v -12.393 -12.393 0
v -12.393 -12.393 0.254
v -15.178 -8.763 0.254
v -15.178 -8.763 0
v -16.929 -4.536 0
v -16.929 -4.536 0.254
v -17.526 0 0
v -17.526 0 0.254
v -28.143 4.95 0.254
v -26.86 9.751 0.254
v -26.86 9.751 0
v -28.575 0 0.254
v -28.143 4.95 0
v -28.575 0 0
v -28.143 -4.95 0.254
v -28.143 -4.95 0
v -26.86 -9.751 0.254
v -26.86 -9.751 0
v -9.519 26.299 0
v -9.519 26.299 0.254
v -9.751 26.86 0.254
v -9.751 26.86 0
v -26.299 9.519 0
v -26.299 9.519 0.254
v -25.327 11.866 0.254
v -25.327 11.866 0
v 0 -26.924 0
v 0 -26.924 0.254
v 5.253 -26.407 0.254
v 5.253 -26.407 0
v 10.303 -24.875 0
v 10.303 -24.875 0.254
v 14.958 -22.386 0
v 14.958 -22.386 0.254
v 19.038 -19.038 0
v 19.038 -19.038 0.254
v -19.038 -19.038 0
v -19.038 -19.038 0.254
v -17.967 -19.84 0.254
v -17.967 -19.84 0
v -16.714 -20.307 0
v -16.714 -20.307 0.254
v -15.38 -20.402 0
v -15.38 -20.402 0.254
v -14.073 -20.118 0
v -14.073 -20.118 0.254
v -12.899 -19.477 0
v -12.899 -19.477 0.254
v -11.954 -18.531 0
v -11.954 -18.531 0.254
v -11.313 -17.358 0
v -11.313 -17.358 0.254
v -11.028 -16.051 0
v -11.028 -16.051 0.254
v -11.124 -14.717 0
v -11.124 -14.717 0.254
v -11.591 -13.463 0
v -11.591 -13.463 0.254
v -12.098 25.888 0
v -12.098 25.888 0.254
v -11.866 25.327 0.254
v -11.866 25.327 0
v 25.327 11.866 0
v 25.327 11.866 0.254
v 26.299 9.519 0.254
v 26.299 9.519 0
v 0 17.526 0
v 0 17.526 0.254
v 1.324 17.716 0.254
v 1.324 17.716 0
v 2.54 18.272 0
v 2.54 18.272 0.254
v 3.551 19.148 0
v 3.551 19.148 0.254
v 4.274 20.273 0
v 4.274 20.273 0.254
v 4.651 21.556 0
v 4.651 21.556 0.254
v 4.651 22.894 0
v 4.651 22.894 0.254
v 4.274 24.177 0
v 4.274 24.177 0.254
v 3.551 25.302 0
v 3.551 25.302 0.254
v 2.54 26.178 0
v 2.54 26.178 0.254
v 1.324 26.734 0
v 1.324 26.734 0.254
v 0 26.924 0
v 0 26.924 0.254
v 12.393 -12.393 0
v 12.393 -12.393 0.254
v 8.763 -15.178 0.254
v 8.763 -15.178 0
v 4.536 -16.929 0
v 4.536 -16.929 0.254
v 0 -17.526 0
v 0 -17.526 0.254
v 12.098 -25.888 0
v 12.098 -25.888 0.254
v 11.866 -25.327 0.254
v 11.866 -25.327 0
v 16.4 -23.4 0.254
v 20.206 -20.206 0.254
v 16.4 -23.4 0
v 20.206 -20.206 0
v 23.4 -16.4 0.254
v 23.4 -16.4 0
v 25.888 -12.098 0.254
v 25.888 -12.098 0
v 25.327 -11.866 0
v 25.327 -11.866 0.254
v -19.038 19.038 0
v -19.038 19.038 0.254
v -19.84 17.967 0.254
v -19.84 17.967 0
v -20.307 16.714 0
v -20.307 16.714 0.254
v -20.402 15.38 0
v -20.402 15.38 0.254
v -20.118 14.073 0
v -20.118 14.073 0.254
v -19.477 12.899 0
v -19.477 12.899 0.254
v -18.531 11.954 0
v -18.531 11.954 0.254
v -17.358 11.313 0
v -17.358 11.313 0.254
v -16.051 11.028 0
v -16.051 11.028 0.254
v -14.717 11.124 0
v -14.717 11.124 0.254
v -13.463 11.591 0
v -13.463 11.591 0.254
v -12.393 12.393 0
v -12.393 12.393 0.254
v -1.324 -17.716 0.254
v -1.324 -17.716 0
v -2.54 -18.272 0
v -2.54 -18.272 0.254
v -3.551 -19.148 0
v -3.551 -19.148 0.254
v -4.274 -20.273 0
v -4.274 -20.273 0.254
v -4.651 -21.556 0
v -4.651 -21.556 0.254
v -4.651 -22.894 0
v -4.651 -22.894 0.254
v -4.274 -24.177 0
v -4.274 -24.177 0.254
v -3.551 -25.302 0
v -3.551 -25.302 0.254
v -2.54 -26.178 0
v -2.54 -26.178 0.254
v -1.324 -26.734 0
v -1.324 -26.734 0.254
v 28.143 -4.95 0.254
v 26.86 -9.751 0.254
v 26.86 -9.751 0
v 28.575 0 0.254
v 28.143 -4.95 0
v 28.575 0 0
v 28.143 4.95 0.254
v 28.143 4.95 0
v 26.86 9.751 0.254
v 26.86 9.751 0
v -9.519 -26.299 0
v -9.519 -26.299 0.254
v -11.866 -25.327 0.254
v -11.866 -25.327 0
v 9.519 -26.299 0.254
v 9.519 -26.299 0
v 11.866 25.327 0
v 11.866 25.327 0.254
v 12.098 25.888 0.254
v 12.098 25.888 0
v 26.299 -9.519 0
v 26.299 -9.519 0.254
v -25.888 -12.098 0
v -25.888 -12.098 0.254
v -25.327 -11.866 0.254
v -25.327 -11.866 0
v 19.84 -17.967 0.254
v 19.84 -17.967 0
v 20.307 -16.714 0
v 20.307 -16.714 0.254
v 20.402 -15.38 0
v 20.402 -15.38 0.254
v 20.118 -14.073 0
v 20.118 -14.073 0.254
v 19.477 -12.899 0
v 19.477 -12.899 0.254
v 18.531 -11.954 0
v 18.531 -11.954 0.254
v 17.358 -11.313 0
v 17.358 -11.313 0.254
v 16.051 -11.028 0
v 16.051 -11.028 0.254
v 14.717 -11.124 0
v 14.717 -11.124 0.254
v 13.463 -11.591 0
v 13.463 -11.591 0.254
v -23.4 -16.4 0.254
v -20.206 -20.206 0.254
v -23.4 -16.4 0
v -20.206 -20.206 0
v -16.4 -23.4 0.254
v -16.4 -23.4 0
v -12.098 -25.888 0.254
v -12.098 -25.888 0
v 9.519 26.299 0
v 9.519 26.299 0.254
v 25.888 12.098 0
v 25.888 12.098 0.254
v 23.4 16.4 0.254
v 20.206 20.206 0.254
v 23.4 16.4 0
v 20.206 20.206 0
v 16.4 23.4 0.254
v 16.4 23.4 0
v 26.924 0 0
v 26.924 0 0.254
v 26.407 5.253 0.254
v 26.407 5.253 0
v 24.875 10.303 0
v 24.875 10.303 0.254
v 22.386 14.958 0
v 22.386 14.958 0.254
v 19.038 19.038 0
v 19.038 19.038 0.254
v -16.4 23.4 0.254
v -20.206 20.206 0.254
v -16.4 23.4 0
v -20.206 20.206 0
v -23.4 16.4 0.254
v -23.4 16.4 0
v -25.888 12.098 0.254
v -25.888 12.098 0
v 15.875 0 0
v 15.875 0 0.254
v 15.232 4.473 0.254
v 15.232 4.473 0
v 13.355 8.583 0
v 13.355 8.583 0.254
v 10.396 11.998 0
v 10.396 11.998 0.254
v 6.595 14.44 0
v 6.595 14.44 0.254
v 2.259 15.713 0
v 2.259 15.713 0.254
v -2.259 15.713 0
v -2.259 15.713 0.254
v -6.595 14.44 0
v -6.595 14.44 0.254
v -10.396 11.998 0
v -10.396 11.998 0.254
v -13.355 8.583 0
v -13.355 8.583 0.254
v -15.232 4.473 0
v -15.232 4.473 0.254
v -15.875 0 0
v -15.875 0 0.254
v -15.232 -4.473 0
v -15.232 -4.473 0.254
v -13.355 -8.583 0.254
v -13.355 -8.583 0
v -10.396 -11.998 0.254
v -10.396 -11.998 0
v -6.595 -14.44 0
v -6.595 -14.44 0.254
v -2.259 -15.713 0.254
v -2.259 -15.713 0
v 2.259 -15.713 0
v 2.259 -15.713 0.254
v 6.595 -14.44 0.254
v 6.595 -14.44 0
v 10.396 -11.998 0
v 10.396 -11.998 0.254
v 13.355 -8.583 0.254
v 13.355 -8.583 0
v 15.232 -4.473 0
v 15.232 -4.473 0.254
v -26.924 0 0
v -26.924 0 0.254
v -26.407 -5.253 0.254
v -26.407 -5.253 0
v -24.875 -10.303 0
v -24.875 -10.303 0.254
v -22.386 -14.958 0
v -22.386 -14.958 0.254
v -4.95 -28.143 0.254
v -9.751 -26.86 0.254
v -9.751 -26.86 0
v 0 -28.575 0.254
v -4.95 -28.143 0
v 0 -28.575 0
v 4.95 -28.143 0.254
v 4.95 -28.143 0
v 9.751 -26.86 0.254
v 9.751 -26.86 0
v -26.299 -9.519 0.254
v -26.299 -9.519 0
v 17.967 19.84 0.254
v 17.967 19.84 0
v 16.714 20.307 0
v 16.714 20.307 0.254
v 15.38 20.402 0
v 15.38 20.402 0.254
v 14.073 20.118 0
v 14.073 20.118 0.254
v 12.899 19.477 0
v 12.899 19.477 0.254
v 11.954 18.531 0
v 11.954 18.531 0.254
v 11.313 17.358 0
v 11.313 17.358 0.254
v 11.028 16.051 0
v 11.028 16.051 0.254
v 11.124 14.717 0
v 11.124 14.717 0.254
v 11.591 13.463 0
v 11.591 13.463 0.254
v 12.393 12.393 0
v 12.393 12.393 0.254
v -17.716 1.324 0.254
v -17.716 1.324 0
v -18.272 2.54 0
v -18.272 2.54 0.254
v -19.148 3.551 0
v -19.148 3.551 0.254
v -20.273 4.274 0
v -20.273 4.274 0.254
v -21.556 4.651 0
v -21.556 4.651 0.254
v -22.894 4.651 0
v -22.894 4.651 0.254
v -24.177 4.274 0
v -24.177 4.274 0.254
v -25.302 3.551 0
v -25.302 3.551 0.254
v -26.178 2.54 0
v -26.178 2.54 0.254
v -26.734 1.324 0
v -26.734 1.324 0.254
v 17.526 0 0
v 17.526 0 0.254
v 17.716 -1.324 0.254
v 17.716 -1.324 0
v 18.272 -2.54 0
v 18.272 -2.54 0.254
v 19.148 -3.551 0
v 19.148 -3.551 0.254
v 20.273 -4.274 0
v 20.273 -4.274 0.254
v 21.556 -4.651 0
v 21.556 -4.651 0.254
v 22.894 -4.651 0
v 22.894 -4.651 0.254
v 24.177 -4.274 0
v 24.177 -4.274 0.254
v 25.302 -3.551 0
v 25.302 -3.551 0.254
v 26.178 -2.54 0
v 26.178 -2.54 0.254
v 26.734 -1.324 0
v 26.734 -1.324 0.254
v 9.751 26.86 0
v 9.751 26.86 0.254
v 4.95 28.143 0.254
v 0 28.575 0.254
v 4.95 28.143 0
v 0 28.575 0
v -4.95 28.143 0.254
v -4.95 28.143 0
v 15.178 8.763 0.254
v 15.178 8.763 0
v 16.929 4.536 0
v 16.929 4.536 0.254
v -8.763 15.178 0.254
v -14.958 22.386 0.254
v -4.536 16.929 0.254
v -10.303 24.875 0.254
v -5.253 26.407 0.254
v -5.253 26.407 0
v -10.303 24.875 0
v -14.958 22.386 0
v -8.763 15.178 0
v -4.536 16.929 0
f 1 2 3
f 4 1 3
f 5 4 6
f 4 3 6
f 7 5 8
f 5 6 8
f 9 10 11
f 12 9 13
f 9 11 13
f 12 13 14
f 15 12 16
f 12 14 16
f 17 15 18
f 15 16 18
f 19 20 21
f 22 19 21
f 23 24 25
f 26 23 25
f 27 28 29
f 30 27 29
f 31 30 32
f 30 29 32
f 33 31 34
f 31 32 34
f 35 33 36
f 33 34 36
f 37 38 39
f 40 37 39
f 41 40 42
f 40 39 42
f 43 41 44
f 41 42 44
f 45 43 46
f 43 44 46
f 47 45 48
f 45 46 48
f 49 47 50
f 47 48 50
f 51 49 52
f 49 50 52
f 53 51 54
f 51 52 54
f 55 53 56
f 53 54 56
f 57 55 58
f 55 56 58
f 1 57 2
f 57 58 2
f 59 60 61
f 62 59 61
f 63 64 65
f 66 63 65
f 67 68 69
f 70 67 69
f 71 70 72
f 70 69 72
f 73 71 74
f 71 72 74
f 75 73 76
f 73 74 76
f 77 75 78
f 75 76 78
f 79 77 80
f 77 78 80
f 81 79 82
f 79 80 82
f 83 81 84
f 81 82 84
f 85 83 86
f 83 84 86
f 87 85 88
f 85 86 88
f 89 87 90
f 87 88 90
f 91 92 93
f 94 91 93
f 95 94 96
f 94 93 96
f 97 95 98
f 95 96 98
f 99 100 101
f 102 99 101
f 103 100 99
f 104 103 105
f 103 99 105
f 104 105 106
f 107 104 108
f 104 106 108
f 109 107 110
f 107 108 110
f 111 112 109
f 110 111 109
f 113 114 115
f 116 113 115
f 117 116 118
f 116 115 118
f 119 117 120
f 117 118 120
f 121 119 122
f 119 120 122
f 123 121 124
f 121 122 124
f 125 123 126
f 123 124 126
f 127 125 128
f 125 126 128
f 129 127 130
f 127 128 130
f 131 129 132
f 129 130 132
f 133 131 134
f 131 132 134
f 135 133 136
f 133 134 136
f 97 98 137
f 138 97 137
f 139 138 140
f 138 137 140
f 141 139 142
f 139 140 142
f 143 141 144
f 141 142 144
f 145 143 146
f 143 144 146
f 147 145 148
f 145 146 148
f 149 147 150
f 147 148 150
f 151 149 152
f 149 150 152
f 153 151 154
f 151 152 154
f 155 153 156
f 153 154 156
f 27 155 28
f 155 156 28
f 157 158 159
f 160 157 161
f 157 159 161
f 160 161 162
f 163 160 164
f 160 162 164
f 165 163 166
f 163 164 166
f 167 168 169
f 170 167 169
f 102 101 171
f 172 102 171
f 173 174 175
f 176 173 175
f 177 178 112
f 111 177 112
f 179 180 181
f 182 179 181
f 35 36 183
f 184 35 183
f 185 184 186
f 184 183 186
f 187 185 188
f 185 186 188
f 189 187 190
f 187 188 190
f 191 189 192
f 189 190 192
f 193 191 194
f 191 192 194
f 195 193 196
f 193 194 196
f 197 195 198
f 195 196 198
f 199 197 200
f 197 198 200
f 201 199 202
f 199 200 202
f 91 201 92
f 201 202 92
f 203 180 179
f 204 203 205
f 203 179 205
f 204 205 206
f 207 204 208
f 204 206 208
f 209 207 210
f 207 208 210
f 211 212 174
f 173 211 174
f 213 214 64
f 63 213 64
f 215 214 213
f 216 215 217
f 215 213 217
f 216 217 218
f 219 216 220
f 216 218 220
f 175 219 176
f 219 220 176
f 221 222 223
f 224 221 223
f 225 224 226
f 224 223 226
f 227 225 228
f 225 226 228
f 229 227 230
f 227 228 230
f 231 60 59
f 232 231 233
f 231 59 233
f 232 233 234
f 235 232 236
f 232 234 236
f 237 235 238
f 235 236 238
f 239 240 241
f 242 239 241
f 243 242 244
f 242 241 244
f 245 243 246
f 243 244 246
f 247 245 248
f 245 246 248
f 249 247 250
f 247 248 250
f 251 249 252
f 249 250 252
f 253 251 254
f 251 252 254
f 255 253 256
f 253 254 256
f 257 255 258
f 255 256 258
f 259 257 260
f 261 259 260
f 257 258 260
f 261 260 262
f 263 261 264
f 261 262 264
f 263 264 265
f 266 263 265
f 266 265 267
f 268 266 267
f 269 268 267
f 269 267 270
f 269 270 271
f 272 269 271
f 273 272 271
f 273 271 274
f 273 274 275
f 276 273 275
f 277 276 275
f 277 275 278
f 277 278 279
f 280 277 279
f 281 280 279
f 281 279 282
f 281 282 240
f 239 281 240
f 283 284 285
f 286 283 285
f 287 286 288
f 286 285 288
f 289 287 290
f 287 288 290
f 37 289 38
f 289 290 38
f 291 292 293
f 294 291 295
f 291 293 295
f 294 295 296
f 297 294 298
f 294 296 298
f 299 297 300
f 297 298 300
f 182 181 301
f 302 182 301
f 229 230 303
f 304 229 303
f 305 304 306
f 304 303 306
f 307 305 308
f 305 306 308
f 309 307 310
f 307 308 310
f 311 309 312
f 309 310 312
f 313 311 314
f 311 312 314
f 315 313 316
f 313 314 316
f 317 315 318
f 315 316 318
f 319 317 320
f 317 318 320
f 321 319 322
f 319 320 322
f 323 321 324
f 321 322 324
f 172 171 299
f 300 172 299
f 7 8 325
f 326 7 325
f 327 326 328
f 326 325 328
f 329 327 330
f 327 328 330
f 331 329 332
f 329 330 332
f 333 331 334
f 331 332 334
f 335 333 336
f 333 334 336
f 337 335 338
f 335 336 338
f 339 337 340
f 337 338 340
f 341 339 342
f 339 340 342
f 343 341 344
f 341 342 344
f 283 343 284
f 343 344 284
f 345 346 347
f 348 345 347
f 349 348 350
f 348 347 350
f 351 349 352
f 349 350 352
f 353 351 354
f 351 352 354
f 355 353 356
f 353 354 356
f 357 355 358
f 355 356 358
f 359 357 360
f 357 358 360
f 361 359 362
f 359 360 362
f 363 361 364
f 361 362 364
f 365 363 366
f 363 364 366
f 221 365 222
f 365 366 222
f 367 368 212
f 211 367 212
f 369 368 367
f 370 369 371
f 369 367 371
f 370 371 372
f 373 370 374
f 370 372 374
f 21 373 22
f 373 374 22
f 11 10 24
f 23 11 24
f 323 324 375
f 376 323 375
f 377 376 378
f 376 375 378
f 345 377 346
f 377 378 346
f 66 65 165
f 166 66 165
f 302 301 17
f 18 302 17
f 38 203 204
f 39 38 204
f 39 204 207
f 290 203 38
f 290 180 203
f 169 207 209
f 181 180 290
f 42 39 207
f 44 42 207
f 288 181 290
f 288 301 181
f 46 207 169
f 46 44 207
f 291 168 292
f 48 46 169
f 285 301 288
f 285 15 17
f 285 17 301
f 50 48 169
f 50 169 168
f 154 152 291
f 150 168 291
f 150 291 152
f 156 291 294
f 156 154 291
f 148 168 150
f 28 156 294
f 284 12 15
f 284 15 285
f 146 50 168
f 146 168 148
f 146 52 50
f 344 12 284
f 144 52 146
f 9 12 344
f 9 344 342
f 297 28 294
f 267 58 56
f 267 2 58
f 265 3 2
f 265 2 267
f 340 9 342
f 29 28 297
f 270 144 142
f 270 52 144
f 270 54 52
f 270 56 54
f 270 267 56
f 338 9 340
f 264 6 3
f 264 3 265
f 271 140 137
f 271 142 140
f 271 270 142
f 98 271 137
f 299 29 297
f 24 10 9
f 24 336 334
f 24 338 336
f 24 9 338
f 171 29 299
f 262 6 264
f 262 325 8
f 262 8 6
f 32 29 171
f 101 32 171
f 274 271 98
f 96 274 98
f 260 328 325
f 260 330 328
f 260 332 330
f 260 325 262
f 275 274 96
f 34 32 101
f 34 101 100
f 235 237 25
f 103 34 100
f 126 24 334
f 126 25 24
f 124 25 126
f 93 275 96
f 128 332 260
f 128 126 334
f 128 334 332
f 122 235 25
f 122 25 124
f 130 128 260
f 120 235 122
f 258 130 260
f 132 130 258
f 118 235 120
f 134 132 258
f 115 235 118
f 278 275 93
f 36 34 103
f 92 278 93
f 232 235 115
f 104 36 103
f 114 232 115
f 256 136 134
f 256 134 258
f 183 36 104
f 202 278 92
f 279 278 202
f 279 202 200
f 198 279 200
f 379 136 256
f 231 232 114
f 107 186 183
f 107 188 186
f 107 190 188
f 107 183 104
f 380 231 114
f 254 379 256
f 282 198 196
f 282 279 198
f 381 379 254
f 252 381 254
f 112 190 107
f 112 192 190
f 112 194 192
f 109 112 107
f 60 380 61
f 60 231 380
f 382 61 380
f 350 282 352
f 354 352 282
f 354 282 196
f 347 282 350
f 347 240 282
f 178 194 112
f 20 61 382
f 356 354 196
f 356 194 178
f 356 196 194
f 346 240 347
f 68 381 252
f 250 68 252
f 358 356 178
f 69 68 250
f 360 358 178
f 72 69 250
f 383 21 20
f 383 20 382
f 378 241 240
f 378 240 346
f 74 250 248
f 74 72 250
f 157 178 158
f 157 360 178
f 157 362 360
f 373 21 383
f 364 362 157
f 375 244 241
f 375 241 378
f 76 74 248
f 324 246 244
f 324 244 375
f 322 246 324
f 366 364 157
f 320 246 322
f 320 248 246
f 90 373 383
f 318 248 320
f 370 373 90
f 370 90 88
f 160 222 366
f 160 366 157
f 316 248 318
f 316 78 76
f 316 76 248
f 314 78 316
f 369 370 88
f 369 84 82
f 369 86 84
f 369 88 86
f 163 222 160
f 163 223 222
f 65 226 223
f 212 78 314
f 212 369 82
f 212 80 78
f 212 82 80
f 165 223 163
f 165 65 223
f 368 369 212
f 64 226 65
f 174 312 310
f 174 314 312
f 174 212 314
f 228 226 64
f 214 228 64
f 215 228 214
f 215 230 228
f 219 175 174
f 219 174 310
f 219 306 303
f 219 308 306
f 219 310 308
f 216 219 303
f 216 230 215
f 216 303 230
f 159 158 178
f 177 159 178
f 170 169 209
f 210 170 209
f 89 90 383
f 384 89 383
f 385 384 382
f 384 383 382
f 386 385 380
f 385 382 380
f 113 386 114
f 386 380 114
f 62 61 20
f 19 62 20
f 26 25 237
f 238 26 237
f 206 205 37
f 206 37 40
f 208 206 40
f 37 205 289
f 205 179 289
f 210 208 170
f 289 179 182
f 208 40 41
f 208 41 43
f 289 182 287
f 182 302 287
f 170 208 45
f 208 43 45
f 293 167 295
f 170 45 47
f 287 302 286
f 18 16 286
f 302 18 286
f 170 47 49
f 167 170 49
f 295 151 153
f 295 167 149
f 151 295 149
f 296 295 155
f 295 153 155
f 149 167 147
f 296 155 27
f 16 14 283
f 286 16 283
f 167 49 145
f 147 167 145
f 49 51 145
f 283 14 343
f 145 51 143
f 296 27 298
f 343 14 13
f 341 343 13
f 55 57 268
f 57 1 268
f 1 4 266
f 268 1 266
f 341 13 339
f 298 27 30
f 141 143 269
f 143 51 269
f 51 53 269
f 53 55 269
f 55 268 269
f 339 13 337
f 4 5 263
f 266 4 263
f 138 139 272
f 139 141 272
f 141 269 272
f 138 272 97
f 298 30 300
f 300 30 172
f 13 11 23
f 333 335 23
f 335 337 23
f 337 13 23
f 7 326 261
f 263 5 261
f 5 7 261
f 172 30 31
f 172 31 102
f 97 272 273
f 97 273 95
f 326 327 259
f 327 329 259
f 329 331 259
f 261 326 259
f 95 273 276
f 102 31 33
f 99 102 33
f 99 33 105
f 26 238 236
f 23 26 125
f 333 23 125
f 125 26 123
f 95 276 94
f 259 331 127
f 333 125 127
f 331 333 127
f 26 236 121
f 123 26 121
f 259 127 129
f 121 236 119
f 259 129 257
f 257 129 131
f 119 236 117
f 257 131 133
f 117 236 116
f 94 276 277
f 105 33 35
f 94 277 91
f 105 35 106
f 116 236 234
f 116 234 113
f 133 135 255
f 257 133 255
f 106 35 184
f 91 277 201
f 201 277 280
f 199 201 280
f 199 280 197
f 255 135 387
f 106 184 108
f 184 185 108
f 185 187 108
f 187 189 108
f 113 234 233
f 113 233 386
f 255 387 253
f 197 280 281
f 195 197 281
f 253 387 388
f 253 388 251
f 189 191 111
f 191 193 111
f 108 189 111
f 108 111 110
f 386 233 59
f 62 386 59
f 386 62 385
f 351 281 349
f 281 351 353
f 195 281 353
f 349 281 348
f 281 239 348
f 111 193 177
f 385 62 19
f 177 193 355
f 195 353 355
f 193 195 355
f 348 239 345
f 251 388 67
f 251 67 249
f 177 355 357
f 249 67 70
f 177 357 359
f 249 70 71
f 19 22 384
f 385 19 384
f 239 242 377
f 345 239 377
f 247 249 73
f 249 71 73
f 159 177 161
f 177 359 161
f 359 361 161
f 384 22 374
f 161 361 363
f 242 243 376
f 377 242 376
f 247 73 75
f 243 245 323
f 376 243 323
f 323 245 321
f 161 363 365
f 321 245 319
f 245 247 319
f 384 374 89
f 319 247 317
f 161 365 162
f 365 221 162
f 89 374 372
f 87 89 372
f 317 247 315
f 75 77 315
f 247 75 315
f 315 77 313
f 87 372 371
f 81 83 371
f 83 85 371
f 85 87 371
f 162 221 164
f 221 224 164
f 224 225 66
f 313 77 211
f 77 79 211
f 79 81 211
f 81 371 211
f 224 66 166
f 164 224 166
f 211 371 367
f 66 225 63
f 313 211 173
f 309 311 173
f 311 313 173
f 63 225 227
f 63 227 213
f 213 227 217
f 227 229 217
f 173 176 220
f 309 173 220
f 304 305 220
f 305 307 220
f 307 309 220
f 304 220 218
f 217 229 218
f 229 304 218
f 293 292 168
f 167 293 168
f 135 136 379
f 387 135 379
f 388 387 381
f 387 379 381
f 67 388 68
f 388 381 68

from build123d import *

# Parameters (mm, degrees)
SKETCH4_R           = 28.575
BOSS_EXTRUDE2_DEPTH = 0.254
SKETCH5_R           = 15.875
CUT_EXTRUDE5_DEPTH  = 1.254
CUT_EXTRUDE6_DEPTH  = 1.254
CUT_EXTRUDE11_DEPTH = 1.254


with BuildPart() as part:
    # Sketch4 → Boss-Extrude2 (new body)
    with BuildSketch(Plane.XY):
        Circle(SKETCH4_R)
    extrude(amount=BOSS_EXTRUDE2_DEPTH)

    # Sketch5 → Cut-Extrude5 (cut, through all)
    with BuildSketch(Plane.XY.offset(0.254)):
        Circle(SKETCH5_R)
    extrude(amount=-CUT_EXTRUDE5_DEPTH, mode=Mode.SUBTRACT)

    # Sketch6 → Cut-Extrude6 (cut, through all)
    with BuildSketch(Plane.XY.offset(0.254)):
        with BuildLine():
            ThreePointArc((19.038143, 19.038142953), (12.392753451, 19.038142981), (12.392753462, 12.392753432))
            ThreePointArc((12.392753462, 12.392753432), (16.1919128, 6.706909562), (17.526, -5.71e-07))
            ThreePointArc((17.526, -5.71e-07), (22.224999847, -4.699), (26.924, -8.77e-07))
            ThreePointArc((26.924, -8.77e-07), (24.874532708, 10.303368312), (19.038143, 19.038142953))
        make_face()
        with BuildLine():
            ThreePointArc((19.038142953, -19.038143), (19.038142981, -12.392753451), (12.392753432, -12.392753462))
            ThreePointArc((12.392753432, -12.392753462), (6.706909562, -16.1919128), (-5.71e-07, -17.526))
            ThreePointArc((-5.71e-07, -17.526), (-4.699, -22.224999847), (-8.77e-07, -26.924))
            ThreePointArc((-8.77e-07, -26.924), (10.303368312, -24.874532708), (19.038142953, -19.038143))
        make_face()
        with BuildLine():
            ThreePointArc((-19.038143, -19.038142953), (-12.392753451, -19.038142981), (-12.392753462, -12.392753432))
            ThreePointArc((-12.392753462, -12.392753432), (-16.1919128, -6.706909562), (-17.526, 5.71e-07))
            ThreePointArc((-17.526, 5.71e-07), (-22.224999847, 4.699), (-26.924, 8.77e-07))
            ThreePointArc((-26.924, 8.77e-07), (-24.874532708, -10.303368312), (-19.038143, -19.038142953))
        make_face()
        with BuildLine():
            ThreePointArc((-19.038142953, 19.038143), (-19.038142981, 12.392753451), (-12.392753432, 12.392753462))
            ThreePointArc((-12.392753432, 12.392753462), (-6.706909562, 16.1919128), (5.71e-07, 17.526))
            ThreePointArc((5.71e-07, 17.526), (4.699, 22.224999847), (8.77e-07, 26.924))
            ThreePointArc((8.77e-07, 26.924), (-10.303368312, 24.874532708), (-19.038142953, 19.038143))
        make_face()
    extrude(amount=-CUT_EXTRUDE6_DEPTH, mode=Mode.SUBTRACT)

    # Sketch8 → Cut-Extrude11 (cut, through all)
    with BuildSketch(Plane.XY.offset(0.254)):
        Polygon((27.472529104, 10.004856053), (26.500513186, 12.351510066), (25.327186179, 11.865502107), (26.299202097, 9.518848094), align=None)
        Polygon((-10.004856053, 27.472529104), (-12.351510066, 26.500513186), (-11.865502107, 25.327186179), (-9.518848094, 26.299202097), align=None)
        Polygon((-26.500513186, 12.351510066), (-27.472529104, 10.004856053), (-26.299202097, 9.518848094), (-25.327186179, 11.865502107), align=None)
        Polygon((-27.472529104, -10.004856053), (-26.500513186, -12.351510066), (-25.327186179, -11.865502107), (-26.299202097, -9.518848094), align=None)
        Polygon((-12.351510066, -26.500513186), (-10.004856053, -27.472529104), (-9.518848094, -26.299202097), (-11.865502107, -25.327186179), align=None)
        Polygon((10.004856053, -27.472529104), (12.351510066, -26.500513186), (11.865502107, -25.327186179), (9.518848094, -26.299202097), align=None)
        Polygon((26.500513186, -12.351510066), (27.472529104, -10.004856053), (26.299202097, -9.518848094), (25.327186179, -11.865502107), align=None)
        Polygon((12.351510066, 26.500513186), (10.004856053, 27.472529104), (9.518848094, 26.299202097), (11.865502107, 25.327186179), align=None)
    extrude(amount=-CUT_EXTRUDE11_DEPTH, mode=Mode.SUBTRACT)


solid = part.part
